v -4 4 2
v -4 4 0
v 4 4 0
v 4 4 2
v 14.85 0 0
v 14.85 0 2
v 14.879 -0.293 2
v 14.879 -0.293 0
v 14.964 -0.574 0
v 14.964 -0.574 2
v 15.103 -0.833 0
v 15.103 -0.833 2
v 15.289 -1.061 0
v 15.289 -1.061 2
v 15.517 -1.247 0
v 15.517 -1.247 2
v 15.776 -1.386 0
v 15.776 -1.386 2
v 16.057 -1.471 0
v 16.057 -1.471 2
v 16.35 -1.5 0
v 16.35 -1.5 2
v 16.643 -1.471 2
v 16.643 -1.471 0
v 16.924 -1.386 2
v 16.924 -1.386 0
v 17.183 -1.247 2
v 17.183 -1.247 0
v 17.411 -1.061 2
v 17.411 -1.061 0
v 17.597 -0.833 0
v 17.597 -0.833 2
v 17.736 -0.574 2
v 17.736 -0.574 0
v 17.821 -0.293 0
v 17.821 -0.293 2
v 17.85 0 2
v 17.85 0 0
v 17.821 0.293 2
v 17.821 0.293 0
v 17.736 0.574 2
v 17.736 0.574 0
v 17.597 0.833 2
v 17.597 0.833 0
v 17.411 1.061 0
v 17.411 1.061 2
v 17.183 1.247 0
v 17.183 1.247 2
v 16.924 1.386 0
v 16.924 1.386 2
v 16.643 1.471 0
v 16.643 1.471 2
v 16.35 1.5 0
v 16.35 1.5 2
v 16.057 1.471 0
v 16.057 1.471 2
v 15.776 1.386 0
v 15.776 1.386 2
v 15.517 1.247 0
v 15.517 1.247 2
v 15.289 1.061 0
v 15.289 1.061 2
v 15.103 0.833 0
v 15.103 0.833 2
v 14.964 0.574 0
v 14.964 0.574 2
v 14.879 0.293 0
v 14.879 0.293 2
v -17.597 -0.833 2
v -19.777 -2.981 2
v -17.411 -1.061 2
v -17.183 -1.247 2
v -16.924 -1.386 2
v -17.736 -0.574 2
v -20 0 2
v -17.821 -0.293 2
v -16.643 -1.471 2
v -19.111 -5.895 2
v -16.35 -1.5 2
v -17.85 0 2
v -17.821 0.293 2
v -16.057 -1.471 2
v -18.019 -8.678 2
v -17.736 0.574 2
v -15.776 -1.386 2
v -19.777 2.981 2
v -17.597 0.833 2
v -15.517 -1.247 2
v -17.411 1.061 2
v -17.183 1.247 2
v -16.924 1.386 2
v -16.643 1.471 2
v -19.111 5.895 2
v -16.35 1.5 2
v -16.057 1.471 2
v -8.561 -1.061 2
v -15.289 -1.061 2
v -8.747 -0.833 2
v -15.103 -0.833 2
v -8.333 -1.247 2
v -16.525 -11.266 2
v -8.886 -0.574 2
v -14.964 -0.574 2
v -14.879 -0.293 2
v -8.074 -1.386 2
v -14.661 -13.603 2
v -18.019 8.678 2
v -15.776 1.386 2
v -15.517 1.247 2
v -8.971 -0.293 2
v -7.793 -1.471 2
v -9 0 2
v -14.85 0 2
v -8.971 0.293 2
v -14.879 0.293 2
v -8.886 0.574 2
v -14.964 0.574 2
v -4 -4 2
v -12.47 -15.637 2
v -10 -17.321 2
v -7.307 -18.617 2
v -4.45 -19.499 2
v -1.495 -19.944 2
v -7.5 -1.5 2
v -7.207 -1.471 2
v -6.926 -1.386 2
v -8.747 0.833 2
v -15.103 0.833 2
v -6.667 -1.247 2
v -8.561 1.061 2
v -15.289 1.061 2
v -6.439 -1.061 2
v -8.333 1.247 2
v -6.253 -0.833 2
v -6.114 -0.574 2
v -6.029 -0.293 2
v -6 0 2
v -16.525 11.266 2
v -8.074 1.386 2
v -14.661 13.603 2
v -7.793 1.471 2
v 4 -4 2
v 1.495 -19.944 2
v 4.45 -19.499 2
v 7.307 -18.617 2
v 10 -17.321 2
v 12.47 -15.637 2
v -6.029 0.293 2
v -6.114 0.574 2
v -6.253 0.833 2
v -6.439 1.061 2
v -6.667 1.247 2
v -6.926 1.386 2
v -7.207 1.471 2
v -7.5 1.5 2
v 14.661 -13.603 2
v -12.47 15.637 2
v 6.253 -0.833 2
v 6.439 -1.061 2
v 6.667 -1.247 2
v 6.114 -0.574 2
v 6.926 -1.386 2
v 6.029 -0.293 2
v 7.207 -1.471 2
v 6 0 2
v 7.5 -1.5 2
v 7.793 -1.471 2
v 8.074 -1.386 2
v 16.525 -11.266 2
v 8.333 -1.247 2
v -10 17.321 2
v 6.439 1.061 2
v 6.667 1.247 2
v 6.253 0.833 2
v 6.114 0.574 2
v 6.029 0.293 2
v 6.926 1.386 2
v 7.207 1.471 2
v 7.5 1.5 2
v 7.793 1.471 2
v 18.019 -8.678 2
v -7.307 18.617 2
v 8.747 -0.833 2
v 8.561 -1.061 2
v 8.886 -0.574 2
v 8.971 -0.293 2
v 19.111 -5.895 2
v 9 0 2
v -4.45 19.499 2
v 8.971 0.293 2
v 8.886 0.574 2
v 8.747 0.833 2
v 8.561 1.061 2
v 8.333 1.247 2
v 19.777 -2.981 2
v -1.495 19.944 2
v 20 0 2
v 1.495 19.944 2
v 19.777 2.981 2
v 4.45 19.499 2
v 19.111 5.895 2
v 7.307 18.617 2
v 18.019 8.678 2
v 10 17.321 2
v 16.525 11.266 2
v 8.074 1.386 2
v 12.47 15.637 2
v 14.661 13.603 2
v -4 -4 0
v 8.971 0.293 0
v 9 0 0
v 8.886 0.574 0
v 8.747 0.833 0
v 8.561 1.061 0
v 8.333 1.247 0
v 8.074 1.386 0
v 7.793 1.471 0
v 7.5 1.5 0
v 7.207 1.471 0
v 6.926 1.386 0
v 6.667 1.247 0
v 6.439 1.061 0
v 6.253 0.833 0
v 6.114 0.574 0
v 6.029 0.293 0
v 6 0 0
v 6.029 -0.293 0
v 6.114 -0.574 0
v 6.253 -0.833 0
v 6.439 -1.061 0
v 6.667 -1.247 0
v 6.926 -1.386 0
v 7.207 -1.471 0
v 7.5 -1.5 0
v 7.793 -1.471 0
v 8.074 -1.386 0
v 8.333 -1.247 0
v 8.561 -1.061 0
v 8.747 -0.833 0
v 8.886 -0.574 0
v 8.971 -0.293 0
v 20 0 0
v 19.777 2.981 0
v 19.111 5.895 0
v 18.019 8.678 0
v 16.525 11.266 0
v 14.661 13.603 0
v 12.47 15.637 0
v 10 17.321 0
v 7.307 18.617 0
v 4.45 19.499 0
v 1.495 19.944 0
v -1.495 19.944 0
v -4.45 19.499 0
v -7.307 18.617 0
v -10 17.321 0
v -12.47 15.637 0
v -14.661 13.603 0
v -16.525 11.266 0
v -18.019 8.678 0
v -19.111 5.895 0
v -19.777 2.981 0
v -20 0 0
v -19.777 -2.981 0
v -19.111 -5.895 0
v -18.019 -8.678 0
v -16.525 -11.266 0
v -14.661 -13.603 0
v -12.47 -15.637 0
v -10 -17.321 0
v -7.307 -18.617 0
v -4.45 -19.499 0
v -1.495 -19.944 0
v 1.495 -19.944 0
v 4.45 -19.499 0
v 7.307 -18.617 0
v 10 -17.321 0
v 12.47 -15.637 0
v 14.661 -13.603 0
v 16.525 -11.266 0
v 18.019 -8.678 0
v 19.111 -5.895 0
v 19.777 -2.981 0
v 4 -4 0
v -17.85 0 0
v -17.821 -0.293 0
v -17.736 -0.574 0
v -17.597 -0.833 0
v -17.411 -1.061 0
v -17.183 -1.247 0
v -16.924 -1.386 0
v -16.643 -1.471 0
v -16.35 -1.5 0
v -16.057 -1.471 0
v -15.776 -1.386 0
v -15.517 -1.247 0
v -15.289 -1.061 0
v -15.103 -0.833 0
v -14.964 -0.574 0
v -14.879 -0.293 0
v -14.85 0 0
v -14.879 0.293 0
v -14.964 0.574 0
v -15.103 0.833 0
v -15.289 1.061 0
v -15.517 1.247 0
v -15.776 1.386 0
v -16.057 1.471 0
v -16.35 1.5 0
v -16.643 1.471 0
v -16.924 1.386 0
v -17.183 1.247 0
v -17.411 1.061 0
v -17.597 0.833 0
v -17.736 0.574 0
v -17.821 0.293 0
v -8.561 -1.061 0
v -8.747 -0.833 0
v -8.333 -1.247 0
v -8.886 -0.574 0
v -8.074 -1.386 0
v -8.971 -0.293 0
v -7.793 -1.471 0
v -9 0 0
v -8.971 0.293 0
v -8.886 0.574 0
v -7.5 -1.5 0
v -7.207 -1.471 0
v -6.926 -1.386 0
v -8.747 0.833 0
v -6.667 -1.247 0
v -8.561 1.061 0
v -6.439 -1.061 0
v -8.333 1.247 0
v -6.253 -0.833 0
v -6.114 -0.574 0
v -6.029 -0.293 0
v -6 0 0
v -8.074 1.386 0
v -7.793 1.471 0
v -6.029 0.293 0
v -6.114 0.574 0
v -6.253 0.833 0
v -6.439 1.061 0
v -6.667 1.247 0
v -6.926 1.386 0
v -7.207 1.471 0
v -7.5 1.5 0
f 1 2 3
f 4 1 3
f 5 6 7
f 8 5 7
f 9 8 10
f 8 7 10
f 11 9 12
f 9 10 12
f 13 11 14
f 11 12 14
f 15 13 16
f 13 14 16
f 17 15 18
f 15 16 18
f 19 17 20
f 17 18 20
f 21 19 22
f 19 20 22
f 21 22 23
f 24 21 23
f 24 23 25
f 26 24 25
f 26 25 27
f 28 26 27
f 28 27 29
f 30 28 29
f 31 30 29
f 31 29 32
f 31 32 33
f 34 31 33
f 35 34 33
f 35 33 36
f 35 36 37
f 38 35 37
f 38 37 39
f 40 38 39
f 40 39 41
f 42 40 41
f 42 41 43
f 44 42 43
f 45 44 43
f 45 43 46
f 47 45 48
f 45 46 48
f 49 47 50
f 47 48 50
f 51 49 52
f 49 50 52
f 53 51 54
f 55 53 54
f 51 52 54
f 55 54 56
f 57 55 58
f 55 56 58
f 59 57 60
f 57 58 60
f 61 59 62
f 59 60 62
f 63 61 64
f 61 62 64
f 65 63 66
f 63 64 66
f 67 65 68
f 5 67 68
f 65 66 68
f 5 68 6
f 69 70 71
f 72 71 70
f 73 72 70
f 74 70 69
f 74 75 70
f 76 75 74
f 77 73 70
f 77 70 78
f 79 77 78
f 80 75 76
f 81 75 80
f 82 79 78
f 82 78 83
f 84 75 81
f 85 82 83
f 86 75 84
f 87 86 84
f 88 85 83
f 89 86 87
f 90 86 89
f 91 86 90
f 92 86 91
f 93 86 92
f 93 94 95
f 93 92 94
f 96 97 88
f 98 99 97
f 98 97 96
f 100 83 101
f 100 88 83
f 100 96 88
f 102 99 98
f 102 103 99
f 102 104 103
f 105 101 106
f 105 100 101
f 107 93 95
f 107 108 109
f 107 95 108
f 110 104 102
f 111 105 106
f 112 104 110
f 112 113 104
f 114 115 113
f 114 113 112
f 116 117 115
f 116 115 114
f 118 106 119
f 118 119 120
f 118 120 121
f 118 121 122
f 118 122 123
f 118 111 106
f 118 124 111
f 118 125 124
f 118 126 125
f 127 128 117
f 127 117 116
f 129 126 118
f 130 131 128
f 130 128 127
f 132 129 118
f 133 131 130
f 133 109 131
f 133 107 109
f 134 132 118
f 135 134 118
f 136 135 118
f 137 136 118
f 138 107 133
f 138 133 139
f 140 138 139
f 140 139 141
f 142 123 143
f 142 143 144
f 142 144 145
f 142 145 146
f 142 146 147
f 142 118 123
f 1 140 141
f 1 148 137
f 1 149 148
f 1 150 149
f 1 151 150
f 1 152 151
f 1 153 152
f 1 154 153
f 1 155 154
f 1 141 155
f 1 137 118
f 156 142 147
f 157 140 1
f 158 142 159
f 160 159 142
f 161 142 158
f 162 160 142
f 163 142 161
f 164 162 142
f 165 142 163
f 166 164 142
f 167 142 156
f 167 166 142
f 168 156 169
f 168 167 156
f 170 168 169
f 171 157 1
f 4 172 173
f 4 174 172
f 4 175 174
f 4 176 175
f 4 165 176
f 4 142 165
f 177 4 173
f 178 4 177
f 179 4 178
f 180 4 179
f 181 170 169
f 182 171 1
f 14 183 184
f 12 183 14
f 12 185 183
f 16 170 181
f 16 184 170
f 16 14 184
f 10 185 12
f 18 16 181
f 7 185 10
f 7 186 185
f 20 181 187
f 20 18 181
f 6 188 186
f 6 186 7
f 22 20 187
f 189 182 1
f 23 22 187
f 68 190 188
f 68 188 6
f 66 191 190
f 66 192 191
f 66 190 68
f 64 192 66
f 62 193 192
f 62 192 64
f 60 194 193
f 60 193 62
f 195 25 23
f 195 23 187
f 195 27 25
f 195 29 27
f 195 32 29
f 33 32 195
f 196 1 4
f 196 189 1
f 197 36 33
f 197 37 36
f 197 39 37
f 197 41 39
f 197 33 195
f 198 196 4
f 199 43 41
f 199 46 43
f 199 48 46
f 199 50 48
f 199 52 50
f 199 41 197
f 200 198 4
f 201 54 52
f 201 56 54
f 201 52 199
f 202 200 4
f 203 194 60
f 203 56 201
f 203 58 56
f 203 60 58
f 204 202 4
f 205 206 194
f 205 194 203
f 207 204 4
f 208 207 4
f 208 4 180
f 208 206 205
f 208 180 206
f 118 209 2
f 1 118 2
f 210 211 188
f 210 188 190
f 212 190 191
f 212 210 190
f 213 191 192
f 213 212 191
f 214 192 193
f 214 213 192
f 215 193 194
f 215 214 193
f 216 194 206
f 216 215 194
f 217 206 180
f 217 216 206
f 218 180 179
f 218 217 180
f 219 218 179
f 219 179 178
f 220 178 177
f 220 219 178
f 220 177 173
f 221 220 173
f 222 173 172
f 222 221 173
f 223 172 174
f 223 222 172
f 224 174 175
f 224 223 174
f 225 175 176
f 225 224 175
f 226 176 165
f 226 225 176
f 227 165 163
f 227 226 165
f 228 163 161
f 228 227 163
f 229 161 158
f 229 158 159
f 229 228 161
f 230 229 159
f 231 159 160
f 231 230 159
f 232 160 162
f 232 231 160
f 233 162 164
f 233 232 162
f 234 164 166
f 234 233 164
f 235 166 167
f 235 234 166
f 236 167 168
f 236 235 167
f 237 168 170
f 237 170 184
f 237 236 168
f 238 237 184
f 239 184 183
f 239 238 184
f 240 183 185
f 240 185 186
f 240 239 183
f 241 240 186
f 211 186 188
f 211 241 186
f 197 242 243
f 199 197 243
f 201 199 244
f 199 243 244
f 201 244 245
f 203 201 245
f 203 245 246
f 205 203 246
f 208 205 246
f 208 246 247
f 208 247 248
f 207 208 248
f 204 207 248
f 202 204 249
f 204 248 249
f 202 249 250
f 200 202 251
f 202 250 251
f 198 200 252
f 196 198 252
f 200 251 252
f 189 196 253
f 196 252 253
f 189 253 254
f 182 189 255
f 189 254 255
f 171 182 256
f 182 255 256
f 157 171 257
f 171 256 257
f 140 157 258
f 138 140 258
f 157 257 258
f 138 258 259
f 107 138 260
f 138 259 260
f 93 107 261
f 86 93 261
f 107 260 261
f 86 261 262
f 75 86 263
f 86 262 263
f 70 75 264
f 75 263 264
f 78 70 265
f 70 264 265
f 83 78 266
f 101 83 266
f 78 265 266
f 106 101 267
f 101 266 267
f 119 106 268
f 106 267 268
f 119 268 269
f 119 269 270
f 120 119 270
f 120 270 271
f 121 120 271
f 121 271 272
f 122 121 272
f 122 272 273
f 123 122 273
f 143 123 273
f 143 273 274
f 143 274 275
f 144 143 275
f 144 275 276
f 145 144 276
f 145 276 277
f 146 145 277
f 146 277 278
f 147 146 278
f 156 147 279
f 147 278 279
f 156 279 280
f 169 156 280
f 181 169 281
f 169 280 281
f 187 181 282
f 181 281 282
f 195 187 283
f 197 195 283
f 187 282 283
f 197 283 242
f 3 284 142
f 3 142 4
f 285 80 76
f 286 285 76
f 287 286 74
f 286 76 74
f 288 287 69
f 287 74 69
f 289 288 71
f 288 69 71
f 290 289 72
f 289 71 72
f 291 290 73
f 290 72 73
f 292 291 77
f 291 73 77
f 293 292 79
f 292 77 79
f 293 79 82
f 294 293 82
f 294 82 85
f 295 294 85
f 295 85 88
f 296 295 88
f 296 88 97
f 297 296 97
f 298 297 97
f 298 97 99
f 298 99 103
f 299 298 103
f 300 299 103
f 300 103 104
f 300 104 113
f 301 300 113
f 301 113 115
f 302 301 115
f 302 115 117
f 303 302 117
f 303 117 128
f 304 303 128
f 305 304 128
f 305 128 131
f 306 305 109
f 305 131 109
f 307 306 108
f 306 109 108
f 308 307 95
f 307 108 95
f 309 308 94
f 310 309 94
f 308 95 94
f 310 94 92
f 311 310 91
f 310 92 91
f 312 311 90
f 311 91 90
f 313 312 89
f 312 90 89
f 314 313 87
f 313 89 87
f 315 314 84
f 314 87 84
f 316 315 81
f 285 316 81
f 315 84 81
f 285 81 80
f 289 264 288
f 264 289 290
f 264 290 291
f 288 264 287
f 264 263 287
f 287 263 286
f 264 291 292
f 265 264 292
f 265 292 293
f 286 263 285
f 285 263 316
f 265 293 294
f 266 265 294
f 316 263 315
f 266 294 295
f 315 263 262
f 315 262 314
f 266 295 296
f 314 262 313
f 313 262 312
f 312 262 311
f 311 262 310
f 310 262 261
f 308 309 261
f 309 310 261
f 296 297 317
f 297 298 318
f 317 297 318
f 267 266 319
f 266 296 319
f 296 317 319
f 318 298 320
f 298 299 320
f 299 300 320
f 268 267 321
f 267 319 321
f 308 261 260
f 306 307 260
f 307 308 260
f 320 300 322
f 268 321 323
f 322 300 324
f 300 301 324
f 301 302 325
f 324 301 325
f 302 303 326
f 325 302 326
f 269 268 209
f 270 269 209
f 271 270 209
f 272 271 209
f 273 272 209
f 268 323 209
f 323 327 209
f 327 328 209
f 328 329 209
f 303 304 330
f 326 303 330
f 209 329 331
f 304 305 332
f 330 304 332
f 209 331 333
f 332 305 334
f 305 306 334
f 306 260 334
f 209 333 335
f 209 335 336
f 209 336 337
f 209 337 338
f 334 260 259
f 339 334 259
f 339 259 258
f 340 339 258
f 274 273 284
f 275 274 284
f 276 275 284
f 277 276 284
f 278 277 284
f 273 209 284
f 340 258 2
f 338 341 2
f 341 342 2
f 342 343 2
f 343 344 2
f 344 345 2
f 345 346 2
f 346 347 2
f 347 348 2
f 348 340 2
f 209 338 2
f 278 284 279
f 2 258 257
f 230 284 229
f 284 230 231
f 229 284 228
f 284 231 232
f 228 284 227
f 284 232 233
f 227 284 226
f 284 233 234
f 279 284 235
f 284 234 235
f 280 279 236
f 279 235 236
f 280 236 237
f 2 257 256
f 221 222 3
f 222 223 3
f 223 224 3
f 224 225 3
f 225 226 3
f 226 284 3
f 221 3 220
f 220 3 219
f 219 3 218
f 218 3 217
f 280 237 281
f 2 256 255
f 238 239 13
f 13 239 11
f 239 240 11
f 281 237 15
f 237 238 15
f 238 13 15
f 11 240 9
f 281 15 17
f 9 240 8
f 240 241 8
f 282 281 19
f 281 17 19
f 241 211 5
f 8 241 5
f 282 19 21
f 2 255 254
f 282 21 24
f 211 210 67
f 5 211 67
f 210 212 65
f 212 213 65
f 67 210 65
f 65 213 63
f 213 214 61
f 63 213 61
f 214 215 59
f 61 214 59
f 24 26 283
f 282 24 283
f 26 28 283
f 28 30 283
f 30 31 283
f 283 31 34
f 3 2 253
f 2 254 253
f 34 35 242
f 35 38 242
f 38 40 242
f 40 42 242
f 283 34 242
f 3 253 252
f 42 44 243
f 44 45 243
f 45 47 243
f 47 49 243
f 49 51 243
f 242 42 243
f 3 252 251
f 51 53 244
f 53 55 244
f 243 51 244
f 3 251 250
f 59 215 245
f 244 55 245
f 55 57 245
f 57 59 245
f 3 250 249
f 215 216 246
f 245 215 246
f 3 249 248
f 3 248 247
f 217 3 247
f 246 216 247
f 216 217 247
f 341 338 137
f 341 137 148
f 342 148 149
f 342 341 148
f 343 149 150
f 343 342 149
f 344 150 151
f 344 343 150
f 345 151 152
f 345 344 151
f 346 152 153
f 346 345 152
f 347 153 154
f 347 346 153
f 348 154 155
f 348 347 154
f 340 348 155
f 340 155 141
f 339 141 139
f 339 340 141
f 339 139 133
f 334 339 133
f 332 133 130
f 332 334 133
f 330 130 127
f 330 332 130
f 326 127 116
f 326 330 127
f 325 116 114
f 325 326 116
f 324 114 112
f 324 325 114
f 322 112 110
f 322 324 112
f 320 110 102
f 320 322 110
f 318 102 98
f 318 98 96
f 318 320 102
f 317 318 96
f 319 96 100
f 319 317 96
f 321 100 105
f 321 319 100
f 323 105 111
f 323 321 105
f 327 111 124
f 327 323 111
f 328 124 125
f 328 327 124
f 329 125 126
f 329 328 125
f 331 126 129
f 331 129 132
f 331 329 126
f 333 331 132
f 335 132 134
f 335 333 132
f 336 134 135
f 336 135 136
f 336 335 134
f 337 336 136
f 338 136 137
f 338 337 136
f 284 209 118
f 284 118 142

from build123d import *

# Parameters (mm, degrees)
F0_R     = 20
F0_W     = 22
F0_H     = 22
F0_R_2   = 10
F0_R_3   = 1.5
F0_W_2   = 8
F0_H_2   = 8
F1_DEPTH = 2
F2_D     = 3
F2_DEPTH = 25
F2_TIP   = 0.9012909285


with BuildPart() as f1:
    # F0 (on Top) → F1 (new body)
    with BuildSketch(Plane.XY):
        Circle(F0_R)
        Rectangle(F0_W, F0_H, mode=Mode.SUBTRACT)
        Rectangle(F0_W, F0_H)
        Circle(F0_R_2, mode=Mode.SUBTRACT)
        Circle(F0_R_2)
        with Locations((-7.5, 0)):
            Circle(F0_R_3, mode=Mode.SUBTRACT)
        Rectangle(F0_W_2, F0_H_2, mode=Mode.SUBTRACT)
        with Locations((7.5, 0)):
            Circle(F0_R_3, mode=Mode.SUBTRACT)
    extrude(amount=F1_DEPTH)

    # F2
    with Locations(Plane(origin=(0, 0, 0), x_dir=(1, 0, 0), z_dir=(0, 0, -1))):
        with Locations((-16.35, 0), (16.35, 0)):
            Hole(F2_D / 2, depth=F2_DEPTH)
            with Locations((0, 0, -(F2_DEPTH + F2_TIP / 2))):  # 118° drill point
                Cone(0, F2_D / 2, F2_TIP, mode=Mode.SUBTRACT)


solid = f1.part
